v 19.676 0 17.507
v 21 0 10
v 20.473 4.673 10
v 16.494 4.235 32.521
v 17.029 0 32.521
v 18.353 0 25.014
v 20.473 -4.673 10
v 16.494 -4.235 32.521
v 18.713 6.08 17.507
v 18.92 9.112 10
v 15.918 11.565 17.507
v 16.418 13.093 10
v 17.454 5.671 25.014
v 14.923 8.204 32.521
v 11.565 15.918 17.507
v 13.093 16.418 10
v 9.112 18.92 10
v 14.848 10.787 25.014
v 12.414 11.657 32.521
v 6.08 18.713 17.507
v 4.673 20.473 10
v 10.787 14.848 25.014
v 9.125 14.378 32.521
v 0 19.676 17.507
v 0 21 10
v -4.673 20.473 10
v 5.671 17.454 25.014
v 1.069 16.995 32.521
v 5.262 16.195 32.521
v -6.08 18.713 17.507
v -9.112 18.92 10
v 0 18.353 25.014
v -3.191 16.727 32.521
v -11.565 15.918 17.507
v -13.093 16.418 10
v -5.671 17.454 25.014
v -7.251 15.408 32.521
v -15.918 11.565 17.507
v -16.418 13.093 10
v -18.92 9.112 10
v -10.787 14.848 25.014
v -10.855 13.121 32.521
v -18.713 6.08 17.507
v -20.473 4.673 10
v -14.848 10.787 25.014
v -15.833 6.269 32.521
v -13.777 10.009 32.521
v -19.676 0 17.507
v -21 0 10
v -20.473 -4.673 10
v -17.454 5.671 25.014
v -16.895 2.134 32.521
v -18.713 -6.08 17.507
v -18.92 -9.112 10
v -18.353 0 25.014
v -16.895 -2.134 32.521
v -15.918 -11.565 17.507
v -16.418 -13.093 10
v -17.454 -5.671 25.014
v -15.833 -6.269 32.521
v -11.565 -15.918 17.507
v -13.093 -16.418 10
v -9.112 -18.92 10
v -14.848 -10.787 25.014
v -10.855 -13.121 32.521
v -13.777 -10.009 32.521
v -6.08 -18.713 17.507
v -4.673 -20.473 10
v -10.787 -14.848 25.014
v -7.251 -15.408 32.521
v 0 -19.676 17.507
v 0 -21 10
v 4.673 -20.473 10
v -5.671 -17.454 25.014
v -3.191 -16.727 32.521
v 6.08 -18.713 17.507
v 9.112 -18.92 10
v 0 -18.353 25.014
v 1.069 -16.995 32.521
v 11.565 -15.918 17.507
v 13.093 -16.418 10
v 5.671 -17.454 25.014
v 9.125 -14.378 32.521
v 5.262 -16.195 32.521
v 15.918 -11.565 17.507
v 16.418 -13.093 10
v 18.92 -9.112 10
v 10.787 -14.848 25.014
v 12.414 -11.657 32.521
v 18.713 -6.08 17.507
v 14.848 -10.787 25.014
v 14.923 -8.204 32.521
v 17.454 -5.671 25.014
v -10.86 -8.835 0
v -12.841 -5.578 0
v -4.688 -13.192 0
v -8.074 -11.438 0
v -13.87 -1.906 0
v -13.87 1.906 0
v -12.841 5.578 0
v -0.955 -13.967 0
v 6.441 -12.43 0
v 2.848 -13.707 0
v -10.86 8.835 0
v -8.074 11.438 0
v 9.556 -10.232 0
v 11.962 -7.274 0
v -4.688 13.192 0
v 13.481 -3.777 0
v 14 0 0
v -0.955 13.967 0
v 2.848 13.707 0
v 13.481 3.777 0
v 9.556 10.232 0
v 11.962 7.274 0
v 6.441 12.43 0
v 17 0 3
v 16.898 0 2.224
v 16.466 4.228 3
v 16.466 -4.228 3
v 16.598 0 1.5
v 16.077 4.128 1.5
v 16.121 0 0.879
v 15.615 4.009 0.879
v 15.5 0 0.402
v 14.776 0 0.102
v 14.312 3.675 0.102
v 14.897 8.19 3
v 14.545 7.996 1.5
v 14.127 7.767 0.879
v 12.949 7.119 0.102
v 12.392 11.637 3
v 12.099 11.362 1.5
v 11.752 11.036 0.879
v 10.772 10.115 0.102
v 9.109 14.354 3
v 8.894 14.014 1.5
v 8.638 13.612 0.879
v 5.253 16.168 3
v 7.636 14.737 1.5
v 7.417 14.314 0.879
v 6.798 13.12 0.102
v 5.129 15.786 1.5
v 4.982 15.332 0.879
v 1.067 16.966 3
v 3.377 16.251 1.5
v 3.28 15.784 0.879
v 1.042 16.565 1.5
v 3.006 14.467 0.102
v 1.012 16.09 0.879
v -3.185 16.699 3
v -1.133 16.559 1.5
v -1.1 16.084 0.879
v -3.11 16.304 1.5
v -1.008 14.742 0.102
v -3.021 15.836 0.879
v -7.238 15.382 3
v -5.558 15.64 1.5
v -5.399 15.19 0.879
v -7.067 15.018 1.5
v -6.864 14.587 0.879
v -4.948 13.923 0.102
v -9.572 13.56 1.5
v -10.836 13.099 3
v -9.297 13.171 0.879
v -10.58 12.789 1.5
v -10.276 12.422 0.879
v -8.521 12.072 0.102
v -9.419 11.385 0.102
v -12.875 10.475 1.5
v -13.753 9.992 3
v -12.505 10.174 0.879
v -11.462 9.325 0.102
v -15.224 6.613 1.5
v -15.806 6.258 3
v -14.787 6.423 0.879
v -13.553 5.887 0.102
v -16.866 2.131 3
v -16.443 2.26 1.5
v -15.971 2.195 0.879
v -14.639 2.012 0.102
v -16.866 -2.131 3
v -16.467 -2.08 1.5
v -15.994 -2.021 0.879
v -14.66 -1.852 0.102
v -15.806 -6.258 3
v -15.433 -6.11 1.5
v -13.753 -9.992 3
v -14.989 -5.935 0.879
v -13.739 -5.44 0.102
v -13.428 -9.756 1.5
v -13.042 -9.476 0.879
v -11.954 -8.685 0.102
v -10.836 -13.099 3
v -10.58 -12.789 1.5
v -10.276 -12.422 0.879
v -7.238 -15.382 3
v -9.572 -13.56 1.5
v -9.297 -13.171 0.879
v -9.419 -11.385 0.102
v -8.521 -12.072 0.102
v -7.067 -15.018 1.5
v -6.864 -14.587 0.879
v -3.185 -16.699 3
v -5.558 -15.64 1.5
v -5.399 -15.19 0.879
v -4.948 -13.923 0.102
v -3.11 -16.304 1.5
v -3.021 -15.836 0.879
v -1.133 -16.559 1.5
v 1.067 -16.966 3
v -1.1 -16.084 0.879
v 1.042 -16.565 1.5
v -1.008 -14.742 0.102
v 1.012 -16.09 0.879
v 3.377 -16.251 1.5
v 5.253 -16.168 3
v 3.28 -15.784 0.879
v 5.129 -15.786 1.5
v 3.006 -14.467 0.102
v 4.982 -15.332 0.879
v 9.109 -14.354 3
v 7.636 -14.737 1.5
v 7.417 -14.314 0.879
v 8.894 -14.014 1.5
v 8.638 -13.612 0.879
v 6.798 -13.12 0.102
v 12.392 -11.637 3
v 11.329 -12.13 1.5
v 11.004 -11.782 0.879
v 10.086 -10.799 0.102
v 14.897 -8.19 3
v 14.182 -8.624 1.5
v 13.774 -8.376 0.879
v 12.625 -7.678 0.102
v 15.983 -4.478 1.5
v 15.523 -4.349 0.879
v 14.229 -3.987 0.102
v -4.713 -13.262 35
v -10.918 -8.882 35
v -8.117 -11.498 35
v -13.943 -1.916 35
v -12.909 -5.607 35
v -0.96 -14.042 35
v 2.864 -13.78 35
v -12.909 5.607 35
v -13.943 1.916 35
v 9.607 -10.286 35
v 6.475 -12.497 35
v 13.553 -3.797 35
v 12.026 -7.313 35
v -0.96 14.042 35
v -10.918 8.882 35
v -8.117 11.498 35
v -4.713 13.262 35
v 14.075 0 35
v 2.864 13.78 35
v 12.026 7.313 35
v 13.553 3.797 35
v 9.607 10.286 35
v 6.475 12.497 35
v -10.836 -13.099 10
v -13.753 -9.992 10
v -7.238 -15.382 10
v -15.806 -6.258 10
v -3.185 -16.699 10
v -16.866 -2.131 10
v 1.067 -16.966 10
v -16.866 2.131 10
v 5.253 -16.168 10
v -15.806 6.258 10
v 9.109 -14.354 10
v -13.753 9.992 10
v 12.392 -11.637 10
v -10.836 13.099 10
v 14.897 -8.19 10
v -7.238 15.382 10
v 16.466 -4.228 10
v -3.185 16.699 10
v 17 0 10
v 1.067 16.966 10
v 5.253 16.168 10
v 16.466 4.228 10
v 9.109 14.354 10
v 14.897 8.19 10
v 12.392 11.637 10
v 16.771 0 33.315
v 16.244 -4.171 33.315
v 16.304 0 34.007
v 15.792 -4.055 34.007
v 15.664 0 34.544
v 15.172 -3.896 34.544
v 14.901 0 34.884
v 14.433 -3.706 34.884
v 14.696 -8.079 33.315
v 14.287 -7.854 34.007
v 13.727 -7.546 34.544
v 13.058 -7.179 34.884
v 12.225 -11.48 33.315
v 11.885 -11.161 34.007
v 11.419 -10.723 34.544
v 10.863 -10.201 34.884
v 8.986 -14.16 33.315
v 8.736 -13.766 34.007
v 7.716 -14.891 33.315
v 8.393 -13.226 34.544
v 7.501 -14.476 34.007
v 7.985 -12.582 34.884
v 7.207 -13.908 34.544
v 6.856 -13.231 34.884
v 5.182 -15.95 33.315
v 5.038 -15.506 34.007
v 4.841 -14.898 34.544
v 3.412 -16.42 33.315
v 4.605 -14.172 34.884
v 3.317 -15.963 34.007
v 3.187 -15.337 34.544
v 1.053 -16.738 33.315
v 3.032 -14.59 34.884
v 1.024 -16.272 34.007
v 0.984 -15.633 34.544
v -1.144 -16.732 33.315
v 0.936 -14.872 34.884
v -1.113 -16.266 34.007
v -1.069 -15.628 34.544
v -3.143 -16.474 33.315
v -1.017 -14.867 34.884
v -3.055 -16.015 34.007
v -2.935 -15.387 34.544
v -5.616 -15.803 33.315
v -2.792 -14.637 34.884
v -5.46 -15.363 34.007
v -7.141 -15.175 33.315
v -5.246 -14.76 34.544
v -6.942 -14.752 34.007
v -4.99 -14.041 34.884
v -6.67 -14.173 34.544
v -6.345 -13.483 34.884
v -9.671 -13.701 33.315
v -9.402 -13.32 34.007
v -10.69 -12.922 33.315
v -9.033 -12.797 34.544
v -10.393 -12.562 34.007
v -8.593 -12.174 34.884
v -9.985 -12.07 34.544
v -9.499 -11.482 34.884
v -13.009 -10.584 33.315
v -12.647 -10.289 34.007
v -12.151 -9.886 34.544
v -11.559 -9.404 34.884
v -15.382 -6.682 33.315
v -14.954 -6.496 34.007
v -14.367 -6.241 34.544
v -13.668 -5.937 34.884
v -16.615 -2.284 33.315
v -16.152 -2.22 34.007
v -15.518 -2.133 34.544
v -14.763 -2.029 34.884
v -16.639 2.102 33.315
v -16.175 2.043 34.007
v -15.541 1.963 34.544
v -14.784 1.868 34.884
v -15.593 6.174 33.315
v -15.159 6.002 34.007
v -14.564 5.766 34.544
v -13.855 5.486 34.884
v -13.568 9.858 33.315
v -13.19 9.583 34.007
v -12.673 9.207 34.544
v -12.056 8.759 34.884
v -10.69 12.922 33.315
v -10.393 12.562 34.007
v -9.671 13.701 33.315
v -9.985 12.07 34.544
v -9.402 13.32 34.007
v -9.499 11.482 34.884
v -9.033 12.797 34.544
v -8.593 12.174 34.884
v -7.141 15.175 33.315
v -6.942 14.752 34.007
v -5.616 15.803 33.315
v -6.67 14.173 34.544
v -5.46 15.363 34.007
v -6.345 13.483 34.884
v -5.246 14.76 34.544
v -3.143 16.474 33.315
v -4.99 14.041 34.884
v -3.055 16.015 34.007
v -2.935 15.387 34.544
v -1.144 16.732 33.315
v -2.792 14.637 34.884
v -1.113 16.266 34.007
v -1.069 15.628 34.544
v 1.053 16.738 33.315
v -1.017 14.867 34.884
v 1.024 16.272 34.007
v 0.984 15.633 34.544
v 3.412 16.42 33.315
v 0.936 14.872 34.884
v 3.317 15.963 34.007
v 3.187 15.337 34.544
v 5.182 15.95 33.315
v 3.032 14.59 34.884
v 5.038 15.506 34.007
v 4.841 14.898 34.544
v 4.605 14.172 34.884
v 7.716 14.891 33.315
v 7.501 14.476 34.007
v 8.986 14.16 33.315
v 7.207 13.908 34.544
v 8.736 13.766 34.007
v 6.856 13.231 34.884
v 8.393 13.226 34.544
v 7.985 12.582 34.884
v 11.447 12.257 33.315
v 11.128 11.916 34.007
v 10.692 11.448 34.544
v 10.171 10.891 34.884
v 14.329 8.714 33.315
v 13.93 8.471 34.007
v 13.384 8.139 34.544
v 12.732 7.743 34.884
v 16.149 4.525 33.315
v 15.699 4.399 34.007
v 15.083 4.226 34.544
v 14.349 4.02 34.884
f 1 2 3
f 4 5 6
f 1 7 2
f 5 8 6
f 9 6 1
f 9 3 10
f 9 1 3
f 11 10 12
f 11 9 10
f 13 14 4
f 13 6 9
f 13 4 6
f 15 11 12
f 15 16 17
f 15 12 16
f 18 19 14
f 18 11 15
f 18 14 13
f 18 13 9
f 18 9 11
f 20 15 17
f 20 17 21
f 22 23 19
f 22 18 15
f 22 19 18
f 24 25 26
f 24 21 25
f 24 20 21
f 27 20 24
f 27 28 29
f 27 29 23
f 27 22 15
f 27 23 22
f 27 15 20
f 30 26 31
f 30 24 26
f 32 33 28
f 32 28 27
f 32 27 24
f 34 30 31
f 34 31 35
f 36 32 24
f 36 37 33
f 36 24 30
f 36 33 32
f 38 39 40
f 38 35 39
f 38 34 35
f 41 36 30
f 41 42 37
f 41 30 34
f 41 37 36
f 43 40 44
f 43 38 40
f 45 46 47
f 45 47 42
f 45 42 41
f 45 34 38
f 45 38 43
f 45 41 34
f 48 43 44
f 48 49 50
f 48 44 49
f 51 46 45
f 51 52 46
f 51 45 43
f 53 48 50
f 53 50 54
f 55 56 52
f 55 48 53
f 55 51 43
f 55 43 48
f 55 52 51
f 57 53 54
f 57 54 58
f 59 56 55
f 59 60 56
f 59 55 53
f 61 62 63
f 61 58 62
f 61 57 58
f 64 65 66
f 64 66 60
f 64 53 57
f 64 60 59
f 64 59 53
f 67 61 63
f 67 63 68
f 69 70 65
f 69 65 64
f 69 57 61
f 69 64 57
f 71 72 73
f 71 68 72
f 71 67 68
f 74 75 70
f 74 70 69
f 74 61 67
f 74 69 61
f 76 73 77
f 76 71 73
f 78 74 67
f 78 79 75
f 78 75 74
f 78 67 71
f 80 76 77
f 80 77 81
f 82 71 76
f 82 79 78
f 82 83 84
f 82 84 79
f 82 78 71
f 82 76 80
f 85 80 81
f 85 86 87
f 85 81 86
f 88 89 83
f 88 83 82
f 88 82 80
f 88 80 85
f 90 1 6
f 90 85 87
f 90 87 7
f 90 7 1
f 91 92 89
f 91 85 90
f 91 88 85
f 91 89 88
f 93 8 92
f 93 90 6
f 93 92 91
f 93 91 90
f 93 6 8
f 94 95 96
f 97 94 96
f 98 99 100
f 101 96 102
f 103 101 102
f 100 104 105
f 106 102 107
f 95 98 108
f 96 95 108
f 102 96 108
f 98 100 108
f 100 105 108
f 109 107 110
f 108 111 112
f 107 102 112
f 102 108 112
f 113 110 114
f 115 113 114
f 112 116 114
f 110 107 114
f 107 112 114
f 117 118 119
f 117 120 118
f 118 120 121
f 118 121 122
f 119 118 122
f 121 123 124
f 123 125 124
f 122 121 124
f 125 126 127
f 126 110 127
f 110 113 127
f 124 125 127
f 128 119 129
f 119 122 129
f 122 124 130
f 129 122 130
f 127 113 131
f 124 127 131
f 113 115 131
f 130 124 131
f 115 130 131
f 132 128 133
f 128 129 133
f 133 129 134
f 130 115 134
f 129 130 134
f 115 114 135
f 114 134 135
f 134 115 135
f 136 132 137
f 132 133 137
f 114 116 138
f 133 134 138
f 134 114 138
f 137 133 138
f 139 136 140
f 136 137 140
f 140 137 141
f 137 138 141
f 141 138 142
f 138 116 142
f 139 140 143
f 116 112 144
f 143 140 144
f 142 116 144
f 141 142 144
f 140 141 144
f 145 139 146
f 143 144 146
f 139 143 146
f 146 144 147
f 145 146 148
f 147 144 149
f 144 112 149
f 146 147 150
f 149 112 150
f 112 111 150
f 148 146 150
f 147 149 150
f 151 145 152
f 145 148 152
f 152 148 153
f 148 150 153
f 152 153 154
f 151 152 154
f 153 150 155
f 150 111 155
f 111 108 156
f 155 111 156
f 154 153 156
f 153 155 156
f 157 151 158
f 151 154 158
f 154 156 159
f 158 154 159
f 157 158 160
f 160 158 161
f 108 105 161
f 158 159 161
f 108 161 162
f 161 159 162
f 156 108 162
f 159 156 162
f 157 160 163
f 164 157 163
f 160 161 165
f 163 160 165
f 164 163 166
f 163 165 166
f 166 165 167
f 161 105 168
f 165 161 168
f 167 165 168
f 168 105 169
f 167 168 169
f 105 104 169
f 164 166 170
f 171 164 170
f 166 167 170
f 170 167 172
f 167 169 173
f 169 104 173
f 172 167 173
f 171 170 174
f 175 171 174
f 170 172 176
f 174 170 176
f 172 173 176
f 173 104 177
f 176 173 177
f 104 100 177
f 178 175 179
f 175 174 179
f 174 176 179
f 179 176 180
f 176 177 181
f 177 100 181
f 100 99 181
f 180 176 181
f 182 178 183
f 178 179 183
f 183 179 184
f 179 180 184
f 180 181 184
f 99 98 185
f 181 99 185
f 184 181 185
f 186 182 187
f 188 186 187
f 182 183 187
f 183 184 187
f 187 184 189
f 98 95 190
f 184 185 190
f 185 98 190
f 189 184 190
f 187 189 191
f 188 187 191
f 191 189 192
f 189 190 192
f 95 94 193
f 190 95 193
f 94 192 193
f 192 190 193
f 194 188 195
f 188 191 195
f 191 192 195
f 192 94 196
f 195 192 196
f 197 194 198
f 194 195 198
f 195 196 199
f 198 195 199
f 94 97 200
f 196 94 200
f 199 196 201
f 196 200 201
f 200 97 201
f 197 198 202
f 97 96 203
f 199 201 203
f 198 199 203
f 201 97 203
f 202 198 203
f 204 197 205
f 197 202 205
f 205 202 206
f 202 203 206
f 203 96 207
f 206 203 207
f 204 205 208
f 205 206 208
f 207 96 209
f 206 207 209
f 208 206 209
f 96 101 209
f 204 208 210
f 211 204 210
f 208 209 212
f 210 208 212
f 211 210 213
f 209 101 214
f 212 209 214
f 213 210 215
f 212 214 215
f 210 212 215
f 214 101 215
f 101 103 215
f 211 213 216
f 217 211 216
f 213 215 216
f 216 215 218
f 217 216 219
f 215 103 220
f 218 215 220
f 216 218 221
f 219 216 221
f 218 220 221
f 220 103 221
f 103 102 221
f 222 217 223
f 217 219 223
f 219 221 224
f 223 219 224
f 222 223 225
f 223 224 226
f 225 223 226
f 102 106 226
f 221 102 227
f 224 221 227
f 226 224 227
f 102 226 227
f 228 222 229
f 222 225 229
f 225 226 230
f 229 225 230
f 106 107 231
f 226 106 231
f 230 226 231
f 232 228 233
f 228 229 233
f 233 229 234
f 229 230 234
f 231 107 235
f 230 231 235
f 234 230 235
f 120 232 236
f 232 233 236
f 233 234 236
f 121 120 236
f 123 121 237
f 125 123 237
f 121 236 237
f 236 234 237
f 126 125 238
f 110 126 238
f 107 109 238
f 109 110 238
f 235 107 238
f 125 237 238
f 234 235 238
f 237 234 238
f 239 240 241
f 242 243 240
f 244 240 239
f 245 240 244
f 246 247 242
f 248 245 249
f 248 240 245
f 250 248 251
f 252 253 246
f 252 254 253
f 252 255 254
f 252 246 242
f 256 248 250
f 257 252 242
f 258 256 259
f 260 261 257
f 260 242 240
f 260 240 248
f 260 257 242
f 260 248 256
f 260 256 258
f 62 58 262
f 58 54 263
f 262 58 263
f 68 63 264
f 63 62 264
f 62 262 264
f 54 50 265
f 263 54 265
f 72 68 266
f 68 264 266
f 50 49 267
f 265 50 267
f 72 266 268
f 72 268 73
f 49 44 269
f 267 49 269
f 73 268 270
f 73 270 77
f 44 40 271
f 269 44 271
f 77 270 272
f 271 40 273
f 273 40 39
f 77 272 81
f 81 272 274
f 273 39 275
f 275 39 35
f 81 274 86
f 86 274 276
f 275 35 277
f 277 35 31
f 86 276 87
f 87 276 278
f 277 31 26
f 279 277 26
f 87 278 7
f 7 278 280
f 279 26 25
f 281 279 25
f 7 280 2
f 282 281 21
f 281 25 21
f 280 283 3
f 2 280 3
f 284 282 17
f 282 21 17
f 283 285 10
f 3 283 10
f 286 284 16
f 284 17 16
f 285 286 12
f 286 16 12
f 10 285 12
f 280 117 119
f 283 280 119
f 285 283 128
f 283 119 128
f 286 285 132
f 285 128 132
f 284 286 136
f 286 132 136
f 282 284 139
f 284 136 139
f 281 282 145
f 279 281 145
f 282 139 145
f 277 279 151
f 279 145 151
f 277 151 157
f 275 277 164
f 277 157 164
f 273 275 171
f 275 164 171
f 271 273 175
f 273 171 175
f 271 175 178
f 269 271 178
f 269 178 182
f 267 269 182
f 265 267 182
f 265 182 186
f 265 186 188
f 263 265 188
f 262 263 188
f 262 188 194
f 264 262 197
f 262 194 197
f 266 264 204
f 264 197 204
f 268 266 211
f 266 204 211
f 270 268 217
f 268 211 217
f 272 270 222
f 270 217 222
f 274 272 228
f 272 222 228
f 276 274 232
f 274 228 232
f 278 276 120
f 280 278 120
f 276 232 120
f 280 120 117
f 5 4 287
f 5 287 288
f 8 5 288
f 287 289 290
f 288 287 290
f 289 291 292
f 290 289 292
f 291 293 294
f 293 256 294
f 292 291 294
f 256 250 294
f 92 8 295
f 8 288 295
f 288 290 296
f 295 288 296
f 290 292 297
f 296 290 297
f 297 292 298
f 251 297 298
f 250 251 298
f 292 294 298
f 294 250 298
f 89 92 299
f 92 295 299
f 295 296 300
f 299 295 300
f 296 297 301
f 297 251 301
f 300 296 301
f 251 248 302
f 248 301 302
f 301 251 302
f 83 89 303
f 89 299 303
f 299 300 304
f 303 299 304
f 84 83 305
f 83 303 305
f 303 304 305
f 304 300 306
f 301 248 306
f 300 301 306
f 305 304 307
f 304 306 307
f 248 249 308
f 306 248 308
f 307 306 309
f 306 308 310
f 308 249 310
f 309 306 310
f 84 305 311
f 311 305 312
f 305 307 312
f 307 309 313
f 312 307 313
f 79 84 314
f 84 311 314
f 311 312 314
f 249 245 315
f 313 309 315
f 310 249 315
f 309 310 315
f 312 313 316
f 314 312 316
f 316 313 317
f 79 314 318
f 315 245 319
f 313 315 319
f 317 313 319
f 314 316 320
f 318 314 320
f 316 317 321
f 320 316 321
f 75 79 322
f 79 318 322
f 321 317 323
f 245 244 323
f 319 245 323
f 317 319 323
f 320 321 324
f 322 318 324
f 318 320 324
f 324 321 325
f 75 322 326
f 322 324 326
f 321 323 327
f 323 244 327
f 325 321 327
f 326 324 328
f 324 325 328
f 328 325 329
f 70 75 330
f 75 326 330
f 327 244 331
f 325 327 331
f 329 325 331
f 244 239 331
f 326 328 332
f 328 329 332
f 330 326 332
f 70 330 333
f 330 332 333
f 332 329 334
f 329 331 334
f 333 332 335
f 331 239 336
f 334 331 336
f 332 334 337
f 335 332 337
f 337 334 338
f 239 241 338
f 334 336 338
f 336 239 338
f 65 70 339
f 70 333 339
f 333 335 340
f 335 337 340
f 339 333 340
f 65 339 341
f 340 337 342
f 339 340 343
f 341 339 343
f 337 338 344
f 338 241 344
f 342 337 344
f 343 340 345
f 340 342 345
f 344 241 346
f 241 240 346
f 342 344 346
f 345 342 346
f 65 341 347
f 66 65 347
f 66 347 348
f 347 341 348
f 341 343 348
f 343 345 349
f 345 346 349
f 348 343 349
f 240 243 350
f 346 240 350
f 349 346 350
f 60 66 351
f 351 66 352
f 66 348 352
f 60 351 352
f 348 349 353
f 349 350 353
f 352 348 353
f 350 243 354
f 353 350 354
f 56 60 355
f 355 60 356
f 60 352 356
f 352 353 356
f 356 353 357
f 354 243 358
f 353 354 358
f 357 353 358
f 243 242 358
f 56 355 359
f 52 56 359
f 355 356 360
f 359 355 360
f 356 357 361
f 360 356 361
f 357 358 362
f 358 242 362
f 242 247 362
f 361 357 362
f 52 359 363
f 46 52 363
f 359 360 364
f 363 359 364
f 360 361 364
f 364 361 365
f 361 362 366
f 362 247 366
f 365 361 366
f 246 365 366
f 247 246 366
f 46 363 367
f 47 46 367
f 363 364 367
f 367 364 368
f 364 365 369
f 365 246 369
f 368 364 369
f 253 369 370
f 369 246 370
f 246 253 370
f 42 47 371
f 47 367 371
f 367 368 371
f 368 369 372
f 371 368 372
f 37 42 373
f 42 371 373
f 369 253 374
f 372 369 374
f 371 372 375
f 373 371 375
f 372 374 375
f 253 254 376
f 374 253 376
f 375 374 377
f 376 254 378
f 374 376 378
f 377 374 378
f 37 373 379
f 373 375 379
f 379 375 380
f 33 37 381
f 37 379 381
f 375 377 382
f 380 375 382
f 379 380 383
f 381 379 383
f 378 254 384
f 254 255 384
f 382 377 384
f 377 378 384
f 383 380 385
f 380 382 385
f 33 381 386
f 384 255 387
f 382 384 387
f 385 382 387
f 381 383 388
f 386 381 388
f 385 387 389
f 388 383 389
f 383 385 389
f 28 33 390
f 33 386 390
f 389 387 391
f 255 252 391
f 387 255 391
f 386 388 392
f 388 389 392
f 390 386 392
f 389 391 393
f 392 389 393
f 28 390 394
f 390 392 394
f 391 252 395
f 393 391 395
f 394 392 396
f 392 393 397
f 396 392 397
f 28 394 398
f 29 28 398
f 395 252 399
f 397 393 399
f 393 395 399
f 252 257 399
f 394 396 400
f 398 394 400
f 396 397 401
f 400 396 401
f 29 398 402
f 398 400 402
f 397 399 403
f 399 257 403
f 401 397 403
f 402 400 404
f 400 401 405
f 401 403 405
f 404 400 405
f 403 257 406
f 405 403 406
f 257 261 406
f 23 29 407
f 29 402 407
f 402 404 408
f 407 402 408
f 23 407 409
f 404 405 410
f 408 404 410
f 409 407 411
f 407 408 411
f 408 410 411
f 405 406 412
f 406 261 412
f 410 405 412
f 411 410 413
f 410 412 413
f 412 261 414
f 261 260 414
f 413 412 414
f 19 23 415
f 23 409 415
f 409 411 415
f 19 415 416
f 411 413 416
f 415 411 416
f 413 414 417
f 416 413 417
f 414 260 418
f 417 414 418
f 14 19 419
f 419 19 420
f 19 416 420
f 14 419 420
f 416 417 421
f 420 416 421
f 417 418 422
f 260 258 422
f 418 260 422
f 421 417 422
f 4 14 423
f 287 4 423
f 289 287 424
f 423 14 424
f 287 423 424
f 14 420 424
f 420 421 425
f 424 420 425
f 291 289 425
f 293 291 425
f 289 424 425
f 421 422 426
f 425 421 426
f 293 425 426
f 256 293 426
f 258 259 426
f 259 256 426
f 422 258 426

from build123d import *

# Parameters (mm, degrees)
F0_R     = 17
F1_DEPTH = 10
F2_R     = 21
F3_DEPTH = 25
F3_TAPER = 10
F4_R     = 3


with BuildPart() as f1:
    # F0 (on Top) → F1 (new body)
    with BuildSketch(Plane.XY):
        Circle(F0_R)
    extrude(amount=F1_DEPTH)

    # F2 (on face) → F3 (join)
    with BuildSketch(Plane.XY.offset(10)):
        Circle(F2_R)
    extrude(amount=F3_DEPTH, taper=F3_TAPER)

    # F4
    f4_edges = [f1.edges().sort_by_distance(p)[0] for p in [
        (-16.591825, 0, 35),
        (-17, 0, 0),
    ]]
    fillet(f4_edges, radius=F4_R)


solid = f1.part
